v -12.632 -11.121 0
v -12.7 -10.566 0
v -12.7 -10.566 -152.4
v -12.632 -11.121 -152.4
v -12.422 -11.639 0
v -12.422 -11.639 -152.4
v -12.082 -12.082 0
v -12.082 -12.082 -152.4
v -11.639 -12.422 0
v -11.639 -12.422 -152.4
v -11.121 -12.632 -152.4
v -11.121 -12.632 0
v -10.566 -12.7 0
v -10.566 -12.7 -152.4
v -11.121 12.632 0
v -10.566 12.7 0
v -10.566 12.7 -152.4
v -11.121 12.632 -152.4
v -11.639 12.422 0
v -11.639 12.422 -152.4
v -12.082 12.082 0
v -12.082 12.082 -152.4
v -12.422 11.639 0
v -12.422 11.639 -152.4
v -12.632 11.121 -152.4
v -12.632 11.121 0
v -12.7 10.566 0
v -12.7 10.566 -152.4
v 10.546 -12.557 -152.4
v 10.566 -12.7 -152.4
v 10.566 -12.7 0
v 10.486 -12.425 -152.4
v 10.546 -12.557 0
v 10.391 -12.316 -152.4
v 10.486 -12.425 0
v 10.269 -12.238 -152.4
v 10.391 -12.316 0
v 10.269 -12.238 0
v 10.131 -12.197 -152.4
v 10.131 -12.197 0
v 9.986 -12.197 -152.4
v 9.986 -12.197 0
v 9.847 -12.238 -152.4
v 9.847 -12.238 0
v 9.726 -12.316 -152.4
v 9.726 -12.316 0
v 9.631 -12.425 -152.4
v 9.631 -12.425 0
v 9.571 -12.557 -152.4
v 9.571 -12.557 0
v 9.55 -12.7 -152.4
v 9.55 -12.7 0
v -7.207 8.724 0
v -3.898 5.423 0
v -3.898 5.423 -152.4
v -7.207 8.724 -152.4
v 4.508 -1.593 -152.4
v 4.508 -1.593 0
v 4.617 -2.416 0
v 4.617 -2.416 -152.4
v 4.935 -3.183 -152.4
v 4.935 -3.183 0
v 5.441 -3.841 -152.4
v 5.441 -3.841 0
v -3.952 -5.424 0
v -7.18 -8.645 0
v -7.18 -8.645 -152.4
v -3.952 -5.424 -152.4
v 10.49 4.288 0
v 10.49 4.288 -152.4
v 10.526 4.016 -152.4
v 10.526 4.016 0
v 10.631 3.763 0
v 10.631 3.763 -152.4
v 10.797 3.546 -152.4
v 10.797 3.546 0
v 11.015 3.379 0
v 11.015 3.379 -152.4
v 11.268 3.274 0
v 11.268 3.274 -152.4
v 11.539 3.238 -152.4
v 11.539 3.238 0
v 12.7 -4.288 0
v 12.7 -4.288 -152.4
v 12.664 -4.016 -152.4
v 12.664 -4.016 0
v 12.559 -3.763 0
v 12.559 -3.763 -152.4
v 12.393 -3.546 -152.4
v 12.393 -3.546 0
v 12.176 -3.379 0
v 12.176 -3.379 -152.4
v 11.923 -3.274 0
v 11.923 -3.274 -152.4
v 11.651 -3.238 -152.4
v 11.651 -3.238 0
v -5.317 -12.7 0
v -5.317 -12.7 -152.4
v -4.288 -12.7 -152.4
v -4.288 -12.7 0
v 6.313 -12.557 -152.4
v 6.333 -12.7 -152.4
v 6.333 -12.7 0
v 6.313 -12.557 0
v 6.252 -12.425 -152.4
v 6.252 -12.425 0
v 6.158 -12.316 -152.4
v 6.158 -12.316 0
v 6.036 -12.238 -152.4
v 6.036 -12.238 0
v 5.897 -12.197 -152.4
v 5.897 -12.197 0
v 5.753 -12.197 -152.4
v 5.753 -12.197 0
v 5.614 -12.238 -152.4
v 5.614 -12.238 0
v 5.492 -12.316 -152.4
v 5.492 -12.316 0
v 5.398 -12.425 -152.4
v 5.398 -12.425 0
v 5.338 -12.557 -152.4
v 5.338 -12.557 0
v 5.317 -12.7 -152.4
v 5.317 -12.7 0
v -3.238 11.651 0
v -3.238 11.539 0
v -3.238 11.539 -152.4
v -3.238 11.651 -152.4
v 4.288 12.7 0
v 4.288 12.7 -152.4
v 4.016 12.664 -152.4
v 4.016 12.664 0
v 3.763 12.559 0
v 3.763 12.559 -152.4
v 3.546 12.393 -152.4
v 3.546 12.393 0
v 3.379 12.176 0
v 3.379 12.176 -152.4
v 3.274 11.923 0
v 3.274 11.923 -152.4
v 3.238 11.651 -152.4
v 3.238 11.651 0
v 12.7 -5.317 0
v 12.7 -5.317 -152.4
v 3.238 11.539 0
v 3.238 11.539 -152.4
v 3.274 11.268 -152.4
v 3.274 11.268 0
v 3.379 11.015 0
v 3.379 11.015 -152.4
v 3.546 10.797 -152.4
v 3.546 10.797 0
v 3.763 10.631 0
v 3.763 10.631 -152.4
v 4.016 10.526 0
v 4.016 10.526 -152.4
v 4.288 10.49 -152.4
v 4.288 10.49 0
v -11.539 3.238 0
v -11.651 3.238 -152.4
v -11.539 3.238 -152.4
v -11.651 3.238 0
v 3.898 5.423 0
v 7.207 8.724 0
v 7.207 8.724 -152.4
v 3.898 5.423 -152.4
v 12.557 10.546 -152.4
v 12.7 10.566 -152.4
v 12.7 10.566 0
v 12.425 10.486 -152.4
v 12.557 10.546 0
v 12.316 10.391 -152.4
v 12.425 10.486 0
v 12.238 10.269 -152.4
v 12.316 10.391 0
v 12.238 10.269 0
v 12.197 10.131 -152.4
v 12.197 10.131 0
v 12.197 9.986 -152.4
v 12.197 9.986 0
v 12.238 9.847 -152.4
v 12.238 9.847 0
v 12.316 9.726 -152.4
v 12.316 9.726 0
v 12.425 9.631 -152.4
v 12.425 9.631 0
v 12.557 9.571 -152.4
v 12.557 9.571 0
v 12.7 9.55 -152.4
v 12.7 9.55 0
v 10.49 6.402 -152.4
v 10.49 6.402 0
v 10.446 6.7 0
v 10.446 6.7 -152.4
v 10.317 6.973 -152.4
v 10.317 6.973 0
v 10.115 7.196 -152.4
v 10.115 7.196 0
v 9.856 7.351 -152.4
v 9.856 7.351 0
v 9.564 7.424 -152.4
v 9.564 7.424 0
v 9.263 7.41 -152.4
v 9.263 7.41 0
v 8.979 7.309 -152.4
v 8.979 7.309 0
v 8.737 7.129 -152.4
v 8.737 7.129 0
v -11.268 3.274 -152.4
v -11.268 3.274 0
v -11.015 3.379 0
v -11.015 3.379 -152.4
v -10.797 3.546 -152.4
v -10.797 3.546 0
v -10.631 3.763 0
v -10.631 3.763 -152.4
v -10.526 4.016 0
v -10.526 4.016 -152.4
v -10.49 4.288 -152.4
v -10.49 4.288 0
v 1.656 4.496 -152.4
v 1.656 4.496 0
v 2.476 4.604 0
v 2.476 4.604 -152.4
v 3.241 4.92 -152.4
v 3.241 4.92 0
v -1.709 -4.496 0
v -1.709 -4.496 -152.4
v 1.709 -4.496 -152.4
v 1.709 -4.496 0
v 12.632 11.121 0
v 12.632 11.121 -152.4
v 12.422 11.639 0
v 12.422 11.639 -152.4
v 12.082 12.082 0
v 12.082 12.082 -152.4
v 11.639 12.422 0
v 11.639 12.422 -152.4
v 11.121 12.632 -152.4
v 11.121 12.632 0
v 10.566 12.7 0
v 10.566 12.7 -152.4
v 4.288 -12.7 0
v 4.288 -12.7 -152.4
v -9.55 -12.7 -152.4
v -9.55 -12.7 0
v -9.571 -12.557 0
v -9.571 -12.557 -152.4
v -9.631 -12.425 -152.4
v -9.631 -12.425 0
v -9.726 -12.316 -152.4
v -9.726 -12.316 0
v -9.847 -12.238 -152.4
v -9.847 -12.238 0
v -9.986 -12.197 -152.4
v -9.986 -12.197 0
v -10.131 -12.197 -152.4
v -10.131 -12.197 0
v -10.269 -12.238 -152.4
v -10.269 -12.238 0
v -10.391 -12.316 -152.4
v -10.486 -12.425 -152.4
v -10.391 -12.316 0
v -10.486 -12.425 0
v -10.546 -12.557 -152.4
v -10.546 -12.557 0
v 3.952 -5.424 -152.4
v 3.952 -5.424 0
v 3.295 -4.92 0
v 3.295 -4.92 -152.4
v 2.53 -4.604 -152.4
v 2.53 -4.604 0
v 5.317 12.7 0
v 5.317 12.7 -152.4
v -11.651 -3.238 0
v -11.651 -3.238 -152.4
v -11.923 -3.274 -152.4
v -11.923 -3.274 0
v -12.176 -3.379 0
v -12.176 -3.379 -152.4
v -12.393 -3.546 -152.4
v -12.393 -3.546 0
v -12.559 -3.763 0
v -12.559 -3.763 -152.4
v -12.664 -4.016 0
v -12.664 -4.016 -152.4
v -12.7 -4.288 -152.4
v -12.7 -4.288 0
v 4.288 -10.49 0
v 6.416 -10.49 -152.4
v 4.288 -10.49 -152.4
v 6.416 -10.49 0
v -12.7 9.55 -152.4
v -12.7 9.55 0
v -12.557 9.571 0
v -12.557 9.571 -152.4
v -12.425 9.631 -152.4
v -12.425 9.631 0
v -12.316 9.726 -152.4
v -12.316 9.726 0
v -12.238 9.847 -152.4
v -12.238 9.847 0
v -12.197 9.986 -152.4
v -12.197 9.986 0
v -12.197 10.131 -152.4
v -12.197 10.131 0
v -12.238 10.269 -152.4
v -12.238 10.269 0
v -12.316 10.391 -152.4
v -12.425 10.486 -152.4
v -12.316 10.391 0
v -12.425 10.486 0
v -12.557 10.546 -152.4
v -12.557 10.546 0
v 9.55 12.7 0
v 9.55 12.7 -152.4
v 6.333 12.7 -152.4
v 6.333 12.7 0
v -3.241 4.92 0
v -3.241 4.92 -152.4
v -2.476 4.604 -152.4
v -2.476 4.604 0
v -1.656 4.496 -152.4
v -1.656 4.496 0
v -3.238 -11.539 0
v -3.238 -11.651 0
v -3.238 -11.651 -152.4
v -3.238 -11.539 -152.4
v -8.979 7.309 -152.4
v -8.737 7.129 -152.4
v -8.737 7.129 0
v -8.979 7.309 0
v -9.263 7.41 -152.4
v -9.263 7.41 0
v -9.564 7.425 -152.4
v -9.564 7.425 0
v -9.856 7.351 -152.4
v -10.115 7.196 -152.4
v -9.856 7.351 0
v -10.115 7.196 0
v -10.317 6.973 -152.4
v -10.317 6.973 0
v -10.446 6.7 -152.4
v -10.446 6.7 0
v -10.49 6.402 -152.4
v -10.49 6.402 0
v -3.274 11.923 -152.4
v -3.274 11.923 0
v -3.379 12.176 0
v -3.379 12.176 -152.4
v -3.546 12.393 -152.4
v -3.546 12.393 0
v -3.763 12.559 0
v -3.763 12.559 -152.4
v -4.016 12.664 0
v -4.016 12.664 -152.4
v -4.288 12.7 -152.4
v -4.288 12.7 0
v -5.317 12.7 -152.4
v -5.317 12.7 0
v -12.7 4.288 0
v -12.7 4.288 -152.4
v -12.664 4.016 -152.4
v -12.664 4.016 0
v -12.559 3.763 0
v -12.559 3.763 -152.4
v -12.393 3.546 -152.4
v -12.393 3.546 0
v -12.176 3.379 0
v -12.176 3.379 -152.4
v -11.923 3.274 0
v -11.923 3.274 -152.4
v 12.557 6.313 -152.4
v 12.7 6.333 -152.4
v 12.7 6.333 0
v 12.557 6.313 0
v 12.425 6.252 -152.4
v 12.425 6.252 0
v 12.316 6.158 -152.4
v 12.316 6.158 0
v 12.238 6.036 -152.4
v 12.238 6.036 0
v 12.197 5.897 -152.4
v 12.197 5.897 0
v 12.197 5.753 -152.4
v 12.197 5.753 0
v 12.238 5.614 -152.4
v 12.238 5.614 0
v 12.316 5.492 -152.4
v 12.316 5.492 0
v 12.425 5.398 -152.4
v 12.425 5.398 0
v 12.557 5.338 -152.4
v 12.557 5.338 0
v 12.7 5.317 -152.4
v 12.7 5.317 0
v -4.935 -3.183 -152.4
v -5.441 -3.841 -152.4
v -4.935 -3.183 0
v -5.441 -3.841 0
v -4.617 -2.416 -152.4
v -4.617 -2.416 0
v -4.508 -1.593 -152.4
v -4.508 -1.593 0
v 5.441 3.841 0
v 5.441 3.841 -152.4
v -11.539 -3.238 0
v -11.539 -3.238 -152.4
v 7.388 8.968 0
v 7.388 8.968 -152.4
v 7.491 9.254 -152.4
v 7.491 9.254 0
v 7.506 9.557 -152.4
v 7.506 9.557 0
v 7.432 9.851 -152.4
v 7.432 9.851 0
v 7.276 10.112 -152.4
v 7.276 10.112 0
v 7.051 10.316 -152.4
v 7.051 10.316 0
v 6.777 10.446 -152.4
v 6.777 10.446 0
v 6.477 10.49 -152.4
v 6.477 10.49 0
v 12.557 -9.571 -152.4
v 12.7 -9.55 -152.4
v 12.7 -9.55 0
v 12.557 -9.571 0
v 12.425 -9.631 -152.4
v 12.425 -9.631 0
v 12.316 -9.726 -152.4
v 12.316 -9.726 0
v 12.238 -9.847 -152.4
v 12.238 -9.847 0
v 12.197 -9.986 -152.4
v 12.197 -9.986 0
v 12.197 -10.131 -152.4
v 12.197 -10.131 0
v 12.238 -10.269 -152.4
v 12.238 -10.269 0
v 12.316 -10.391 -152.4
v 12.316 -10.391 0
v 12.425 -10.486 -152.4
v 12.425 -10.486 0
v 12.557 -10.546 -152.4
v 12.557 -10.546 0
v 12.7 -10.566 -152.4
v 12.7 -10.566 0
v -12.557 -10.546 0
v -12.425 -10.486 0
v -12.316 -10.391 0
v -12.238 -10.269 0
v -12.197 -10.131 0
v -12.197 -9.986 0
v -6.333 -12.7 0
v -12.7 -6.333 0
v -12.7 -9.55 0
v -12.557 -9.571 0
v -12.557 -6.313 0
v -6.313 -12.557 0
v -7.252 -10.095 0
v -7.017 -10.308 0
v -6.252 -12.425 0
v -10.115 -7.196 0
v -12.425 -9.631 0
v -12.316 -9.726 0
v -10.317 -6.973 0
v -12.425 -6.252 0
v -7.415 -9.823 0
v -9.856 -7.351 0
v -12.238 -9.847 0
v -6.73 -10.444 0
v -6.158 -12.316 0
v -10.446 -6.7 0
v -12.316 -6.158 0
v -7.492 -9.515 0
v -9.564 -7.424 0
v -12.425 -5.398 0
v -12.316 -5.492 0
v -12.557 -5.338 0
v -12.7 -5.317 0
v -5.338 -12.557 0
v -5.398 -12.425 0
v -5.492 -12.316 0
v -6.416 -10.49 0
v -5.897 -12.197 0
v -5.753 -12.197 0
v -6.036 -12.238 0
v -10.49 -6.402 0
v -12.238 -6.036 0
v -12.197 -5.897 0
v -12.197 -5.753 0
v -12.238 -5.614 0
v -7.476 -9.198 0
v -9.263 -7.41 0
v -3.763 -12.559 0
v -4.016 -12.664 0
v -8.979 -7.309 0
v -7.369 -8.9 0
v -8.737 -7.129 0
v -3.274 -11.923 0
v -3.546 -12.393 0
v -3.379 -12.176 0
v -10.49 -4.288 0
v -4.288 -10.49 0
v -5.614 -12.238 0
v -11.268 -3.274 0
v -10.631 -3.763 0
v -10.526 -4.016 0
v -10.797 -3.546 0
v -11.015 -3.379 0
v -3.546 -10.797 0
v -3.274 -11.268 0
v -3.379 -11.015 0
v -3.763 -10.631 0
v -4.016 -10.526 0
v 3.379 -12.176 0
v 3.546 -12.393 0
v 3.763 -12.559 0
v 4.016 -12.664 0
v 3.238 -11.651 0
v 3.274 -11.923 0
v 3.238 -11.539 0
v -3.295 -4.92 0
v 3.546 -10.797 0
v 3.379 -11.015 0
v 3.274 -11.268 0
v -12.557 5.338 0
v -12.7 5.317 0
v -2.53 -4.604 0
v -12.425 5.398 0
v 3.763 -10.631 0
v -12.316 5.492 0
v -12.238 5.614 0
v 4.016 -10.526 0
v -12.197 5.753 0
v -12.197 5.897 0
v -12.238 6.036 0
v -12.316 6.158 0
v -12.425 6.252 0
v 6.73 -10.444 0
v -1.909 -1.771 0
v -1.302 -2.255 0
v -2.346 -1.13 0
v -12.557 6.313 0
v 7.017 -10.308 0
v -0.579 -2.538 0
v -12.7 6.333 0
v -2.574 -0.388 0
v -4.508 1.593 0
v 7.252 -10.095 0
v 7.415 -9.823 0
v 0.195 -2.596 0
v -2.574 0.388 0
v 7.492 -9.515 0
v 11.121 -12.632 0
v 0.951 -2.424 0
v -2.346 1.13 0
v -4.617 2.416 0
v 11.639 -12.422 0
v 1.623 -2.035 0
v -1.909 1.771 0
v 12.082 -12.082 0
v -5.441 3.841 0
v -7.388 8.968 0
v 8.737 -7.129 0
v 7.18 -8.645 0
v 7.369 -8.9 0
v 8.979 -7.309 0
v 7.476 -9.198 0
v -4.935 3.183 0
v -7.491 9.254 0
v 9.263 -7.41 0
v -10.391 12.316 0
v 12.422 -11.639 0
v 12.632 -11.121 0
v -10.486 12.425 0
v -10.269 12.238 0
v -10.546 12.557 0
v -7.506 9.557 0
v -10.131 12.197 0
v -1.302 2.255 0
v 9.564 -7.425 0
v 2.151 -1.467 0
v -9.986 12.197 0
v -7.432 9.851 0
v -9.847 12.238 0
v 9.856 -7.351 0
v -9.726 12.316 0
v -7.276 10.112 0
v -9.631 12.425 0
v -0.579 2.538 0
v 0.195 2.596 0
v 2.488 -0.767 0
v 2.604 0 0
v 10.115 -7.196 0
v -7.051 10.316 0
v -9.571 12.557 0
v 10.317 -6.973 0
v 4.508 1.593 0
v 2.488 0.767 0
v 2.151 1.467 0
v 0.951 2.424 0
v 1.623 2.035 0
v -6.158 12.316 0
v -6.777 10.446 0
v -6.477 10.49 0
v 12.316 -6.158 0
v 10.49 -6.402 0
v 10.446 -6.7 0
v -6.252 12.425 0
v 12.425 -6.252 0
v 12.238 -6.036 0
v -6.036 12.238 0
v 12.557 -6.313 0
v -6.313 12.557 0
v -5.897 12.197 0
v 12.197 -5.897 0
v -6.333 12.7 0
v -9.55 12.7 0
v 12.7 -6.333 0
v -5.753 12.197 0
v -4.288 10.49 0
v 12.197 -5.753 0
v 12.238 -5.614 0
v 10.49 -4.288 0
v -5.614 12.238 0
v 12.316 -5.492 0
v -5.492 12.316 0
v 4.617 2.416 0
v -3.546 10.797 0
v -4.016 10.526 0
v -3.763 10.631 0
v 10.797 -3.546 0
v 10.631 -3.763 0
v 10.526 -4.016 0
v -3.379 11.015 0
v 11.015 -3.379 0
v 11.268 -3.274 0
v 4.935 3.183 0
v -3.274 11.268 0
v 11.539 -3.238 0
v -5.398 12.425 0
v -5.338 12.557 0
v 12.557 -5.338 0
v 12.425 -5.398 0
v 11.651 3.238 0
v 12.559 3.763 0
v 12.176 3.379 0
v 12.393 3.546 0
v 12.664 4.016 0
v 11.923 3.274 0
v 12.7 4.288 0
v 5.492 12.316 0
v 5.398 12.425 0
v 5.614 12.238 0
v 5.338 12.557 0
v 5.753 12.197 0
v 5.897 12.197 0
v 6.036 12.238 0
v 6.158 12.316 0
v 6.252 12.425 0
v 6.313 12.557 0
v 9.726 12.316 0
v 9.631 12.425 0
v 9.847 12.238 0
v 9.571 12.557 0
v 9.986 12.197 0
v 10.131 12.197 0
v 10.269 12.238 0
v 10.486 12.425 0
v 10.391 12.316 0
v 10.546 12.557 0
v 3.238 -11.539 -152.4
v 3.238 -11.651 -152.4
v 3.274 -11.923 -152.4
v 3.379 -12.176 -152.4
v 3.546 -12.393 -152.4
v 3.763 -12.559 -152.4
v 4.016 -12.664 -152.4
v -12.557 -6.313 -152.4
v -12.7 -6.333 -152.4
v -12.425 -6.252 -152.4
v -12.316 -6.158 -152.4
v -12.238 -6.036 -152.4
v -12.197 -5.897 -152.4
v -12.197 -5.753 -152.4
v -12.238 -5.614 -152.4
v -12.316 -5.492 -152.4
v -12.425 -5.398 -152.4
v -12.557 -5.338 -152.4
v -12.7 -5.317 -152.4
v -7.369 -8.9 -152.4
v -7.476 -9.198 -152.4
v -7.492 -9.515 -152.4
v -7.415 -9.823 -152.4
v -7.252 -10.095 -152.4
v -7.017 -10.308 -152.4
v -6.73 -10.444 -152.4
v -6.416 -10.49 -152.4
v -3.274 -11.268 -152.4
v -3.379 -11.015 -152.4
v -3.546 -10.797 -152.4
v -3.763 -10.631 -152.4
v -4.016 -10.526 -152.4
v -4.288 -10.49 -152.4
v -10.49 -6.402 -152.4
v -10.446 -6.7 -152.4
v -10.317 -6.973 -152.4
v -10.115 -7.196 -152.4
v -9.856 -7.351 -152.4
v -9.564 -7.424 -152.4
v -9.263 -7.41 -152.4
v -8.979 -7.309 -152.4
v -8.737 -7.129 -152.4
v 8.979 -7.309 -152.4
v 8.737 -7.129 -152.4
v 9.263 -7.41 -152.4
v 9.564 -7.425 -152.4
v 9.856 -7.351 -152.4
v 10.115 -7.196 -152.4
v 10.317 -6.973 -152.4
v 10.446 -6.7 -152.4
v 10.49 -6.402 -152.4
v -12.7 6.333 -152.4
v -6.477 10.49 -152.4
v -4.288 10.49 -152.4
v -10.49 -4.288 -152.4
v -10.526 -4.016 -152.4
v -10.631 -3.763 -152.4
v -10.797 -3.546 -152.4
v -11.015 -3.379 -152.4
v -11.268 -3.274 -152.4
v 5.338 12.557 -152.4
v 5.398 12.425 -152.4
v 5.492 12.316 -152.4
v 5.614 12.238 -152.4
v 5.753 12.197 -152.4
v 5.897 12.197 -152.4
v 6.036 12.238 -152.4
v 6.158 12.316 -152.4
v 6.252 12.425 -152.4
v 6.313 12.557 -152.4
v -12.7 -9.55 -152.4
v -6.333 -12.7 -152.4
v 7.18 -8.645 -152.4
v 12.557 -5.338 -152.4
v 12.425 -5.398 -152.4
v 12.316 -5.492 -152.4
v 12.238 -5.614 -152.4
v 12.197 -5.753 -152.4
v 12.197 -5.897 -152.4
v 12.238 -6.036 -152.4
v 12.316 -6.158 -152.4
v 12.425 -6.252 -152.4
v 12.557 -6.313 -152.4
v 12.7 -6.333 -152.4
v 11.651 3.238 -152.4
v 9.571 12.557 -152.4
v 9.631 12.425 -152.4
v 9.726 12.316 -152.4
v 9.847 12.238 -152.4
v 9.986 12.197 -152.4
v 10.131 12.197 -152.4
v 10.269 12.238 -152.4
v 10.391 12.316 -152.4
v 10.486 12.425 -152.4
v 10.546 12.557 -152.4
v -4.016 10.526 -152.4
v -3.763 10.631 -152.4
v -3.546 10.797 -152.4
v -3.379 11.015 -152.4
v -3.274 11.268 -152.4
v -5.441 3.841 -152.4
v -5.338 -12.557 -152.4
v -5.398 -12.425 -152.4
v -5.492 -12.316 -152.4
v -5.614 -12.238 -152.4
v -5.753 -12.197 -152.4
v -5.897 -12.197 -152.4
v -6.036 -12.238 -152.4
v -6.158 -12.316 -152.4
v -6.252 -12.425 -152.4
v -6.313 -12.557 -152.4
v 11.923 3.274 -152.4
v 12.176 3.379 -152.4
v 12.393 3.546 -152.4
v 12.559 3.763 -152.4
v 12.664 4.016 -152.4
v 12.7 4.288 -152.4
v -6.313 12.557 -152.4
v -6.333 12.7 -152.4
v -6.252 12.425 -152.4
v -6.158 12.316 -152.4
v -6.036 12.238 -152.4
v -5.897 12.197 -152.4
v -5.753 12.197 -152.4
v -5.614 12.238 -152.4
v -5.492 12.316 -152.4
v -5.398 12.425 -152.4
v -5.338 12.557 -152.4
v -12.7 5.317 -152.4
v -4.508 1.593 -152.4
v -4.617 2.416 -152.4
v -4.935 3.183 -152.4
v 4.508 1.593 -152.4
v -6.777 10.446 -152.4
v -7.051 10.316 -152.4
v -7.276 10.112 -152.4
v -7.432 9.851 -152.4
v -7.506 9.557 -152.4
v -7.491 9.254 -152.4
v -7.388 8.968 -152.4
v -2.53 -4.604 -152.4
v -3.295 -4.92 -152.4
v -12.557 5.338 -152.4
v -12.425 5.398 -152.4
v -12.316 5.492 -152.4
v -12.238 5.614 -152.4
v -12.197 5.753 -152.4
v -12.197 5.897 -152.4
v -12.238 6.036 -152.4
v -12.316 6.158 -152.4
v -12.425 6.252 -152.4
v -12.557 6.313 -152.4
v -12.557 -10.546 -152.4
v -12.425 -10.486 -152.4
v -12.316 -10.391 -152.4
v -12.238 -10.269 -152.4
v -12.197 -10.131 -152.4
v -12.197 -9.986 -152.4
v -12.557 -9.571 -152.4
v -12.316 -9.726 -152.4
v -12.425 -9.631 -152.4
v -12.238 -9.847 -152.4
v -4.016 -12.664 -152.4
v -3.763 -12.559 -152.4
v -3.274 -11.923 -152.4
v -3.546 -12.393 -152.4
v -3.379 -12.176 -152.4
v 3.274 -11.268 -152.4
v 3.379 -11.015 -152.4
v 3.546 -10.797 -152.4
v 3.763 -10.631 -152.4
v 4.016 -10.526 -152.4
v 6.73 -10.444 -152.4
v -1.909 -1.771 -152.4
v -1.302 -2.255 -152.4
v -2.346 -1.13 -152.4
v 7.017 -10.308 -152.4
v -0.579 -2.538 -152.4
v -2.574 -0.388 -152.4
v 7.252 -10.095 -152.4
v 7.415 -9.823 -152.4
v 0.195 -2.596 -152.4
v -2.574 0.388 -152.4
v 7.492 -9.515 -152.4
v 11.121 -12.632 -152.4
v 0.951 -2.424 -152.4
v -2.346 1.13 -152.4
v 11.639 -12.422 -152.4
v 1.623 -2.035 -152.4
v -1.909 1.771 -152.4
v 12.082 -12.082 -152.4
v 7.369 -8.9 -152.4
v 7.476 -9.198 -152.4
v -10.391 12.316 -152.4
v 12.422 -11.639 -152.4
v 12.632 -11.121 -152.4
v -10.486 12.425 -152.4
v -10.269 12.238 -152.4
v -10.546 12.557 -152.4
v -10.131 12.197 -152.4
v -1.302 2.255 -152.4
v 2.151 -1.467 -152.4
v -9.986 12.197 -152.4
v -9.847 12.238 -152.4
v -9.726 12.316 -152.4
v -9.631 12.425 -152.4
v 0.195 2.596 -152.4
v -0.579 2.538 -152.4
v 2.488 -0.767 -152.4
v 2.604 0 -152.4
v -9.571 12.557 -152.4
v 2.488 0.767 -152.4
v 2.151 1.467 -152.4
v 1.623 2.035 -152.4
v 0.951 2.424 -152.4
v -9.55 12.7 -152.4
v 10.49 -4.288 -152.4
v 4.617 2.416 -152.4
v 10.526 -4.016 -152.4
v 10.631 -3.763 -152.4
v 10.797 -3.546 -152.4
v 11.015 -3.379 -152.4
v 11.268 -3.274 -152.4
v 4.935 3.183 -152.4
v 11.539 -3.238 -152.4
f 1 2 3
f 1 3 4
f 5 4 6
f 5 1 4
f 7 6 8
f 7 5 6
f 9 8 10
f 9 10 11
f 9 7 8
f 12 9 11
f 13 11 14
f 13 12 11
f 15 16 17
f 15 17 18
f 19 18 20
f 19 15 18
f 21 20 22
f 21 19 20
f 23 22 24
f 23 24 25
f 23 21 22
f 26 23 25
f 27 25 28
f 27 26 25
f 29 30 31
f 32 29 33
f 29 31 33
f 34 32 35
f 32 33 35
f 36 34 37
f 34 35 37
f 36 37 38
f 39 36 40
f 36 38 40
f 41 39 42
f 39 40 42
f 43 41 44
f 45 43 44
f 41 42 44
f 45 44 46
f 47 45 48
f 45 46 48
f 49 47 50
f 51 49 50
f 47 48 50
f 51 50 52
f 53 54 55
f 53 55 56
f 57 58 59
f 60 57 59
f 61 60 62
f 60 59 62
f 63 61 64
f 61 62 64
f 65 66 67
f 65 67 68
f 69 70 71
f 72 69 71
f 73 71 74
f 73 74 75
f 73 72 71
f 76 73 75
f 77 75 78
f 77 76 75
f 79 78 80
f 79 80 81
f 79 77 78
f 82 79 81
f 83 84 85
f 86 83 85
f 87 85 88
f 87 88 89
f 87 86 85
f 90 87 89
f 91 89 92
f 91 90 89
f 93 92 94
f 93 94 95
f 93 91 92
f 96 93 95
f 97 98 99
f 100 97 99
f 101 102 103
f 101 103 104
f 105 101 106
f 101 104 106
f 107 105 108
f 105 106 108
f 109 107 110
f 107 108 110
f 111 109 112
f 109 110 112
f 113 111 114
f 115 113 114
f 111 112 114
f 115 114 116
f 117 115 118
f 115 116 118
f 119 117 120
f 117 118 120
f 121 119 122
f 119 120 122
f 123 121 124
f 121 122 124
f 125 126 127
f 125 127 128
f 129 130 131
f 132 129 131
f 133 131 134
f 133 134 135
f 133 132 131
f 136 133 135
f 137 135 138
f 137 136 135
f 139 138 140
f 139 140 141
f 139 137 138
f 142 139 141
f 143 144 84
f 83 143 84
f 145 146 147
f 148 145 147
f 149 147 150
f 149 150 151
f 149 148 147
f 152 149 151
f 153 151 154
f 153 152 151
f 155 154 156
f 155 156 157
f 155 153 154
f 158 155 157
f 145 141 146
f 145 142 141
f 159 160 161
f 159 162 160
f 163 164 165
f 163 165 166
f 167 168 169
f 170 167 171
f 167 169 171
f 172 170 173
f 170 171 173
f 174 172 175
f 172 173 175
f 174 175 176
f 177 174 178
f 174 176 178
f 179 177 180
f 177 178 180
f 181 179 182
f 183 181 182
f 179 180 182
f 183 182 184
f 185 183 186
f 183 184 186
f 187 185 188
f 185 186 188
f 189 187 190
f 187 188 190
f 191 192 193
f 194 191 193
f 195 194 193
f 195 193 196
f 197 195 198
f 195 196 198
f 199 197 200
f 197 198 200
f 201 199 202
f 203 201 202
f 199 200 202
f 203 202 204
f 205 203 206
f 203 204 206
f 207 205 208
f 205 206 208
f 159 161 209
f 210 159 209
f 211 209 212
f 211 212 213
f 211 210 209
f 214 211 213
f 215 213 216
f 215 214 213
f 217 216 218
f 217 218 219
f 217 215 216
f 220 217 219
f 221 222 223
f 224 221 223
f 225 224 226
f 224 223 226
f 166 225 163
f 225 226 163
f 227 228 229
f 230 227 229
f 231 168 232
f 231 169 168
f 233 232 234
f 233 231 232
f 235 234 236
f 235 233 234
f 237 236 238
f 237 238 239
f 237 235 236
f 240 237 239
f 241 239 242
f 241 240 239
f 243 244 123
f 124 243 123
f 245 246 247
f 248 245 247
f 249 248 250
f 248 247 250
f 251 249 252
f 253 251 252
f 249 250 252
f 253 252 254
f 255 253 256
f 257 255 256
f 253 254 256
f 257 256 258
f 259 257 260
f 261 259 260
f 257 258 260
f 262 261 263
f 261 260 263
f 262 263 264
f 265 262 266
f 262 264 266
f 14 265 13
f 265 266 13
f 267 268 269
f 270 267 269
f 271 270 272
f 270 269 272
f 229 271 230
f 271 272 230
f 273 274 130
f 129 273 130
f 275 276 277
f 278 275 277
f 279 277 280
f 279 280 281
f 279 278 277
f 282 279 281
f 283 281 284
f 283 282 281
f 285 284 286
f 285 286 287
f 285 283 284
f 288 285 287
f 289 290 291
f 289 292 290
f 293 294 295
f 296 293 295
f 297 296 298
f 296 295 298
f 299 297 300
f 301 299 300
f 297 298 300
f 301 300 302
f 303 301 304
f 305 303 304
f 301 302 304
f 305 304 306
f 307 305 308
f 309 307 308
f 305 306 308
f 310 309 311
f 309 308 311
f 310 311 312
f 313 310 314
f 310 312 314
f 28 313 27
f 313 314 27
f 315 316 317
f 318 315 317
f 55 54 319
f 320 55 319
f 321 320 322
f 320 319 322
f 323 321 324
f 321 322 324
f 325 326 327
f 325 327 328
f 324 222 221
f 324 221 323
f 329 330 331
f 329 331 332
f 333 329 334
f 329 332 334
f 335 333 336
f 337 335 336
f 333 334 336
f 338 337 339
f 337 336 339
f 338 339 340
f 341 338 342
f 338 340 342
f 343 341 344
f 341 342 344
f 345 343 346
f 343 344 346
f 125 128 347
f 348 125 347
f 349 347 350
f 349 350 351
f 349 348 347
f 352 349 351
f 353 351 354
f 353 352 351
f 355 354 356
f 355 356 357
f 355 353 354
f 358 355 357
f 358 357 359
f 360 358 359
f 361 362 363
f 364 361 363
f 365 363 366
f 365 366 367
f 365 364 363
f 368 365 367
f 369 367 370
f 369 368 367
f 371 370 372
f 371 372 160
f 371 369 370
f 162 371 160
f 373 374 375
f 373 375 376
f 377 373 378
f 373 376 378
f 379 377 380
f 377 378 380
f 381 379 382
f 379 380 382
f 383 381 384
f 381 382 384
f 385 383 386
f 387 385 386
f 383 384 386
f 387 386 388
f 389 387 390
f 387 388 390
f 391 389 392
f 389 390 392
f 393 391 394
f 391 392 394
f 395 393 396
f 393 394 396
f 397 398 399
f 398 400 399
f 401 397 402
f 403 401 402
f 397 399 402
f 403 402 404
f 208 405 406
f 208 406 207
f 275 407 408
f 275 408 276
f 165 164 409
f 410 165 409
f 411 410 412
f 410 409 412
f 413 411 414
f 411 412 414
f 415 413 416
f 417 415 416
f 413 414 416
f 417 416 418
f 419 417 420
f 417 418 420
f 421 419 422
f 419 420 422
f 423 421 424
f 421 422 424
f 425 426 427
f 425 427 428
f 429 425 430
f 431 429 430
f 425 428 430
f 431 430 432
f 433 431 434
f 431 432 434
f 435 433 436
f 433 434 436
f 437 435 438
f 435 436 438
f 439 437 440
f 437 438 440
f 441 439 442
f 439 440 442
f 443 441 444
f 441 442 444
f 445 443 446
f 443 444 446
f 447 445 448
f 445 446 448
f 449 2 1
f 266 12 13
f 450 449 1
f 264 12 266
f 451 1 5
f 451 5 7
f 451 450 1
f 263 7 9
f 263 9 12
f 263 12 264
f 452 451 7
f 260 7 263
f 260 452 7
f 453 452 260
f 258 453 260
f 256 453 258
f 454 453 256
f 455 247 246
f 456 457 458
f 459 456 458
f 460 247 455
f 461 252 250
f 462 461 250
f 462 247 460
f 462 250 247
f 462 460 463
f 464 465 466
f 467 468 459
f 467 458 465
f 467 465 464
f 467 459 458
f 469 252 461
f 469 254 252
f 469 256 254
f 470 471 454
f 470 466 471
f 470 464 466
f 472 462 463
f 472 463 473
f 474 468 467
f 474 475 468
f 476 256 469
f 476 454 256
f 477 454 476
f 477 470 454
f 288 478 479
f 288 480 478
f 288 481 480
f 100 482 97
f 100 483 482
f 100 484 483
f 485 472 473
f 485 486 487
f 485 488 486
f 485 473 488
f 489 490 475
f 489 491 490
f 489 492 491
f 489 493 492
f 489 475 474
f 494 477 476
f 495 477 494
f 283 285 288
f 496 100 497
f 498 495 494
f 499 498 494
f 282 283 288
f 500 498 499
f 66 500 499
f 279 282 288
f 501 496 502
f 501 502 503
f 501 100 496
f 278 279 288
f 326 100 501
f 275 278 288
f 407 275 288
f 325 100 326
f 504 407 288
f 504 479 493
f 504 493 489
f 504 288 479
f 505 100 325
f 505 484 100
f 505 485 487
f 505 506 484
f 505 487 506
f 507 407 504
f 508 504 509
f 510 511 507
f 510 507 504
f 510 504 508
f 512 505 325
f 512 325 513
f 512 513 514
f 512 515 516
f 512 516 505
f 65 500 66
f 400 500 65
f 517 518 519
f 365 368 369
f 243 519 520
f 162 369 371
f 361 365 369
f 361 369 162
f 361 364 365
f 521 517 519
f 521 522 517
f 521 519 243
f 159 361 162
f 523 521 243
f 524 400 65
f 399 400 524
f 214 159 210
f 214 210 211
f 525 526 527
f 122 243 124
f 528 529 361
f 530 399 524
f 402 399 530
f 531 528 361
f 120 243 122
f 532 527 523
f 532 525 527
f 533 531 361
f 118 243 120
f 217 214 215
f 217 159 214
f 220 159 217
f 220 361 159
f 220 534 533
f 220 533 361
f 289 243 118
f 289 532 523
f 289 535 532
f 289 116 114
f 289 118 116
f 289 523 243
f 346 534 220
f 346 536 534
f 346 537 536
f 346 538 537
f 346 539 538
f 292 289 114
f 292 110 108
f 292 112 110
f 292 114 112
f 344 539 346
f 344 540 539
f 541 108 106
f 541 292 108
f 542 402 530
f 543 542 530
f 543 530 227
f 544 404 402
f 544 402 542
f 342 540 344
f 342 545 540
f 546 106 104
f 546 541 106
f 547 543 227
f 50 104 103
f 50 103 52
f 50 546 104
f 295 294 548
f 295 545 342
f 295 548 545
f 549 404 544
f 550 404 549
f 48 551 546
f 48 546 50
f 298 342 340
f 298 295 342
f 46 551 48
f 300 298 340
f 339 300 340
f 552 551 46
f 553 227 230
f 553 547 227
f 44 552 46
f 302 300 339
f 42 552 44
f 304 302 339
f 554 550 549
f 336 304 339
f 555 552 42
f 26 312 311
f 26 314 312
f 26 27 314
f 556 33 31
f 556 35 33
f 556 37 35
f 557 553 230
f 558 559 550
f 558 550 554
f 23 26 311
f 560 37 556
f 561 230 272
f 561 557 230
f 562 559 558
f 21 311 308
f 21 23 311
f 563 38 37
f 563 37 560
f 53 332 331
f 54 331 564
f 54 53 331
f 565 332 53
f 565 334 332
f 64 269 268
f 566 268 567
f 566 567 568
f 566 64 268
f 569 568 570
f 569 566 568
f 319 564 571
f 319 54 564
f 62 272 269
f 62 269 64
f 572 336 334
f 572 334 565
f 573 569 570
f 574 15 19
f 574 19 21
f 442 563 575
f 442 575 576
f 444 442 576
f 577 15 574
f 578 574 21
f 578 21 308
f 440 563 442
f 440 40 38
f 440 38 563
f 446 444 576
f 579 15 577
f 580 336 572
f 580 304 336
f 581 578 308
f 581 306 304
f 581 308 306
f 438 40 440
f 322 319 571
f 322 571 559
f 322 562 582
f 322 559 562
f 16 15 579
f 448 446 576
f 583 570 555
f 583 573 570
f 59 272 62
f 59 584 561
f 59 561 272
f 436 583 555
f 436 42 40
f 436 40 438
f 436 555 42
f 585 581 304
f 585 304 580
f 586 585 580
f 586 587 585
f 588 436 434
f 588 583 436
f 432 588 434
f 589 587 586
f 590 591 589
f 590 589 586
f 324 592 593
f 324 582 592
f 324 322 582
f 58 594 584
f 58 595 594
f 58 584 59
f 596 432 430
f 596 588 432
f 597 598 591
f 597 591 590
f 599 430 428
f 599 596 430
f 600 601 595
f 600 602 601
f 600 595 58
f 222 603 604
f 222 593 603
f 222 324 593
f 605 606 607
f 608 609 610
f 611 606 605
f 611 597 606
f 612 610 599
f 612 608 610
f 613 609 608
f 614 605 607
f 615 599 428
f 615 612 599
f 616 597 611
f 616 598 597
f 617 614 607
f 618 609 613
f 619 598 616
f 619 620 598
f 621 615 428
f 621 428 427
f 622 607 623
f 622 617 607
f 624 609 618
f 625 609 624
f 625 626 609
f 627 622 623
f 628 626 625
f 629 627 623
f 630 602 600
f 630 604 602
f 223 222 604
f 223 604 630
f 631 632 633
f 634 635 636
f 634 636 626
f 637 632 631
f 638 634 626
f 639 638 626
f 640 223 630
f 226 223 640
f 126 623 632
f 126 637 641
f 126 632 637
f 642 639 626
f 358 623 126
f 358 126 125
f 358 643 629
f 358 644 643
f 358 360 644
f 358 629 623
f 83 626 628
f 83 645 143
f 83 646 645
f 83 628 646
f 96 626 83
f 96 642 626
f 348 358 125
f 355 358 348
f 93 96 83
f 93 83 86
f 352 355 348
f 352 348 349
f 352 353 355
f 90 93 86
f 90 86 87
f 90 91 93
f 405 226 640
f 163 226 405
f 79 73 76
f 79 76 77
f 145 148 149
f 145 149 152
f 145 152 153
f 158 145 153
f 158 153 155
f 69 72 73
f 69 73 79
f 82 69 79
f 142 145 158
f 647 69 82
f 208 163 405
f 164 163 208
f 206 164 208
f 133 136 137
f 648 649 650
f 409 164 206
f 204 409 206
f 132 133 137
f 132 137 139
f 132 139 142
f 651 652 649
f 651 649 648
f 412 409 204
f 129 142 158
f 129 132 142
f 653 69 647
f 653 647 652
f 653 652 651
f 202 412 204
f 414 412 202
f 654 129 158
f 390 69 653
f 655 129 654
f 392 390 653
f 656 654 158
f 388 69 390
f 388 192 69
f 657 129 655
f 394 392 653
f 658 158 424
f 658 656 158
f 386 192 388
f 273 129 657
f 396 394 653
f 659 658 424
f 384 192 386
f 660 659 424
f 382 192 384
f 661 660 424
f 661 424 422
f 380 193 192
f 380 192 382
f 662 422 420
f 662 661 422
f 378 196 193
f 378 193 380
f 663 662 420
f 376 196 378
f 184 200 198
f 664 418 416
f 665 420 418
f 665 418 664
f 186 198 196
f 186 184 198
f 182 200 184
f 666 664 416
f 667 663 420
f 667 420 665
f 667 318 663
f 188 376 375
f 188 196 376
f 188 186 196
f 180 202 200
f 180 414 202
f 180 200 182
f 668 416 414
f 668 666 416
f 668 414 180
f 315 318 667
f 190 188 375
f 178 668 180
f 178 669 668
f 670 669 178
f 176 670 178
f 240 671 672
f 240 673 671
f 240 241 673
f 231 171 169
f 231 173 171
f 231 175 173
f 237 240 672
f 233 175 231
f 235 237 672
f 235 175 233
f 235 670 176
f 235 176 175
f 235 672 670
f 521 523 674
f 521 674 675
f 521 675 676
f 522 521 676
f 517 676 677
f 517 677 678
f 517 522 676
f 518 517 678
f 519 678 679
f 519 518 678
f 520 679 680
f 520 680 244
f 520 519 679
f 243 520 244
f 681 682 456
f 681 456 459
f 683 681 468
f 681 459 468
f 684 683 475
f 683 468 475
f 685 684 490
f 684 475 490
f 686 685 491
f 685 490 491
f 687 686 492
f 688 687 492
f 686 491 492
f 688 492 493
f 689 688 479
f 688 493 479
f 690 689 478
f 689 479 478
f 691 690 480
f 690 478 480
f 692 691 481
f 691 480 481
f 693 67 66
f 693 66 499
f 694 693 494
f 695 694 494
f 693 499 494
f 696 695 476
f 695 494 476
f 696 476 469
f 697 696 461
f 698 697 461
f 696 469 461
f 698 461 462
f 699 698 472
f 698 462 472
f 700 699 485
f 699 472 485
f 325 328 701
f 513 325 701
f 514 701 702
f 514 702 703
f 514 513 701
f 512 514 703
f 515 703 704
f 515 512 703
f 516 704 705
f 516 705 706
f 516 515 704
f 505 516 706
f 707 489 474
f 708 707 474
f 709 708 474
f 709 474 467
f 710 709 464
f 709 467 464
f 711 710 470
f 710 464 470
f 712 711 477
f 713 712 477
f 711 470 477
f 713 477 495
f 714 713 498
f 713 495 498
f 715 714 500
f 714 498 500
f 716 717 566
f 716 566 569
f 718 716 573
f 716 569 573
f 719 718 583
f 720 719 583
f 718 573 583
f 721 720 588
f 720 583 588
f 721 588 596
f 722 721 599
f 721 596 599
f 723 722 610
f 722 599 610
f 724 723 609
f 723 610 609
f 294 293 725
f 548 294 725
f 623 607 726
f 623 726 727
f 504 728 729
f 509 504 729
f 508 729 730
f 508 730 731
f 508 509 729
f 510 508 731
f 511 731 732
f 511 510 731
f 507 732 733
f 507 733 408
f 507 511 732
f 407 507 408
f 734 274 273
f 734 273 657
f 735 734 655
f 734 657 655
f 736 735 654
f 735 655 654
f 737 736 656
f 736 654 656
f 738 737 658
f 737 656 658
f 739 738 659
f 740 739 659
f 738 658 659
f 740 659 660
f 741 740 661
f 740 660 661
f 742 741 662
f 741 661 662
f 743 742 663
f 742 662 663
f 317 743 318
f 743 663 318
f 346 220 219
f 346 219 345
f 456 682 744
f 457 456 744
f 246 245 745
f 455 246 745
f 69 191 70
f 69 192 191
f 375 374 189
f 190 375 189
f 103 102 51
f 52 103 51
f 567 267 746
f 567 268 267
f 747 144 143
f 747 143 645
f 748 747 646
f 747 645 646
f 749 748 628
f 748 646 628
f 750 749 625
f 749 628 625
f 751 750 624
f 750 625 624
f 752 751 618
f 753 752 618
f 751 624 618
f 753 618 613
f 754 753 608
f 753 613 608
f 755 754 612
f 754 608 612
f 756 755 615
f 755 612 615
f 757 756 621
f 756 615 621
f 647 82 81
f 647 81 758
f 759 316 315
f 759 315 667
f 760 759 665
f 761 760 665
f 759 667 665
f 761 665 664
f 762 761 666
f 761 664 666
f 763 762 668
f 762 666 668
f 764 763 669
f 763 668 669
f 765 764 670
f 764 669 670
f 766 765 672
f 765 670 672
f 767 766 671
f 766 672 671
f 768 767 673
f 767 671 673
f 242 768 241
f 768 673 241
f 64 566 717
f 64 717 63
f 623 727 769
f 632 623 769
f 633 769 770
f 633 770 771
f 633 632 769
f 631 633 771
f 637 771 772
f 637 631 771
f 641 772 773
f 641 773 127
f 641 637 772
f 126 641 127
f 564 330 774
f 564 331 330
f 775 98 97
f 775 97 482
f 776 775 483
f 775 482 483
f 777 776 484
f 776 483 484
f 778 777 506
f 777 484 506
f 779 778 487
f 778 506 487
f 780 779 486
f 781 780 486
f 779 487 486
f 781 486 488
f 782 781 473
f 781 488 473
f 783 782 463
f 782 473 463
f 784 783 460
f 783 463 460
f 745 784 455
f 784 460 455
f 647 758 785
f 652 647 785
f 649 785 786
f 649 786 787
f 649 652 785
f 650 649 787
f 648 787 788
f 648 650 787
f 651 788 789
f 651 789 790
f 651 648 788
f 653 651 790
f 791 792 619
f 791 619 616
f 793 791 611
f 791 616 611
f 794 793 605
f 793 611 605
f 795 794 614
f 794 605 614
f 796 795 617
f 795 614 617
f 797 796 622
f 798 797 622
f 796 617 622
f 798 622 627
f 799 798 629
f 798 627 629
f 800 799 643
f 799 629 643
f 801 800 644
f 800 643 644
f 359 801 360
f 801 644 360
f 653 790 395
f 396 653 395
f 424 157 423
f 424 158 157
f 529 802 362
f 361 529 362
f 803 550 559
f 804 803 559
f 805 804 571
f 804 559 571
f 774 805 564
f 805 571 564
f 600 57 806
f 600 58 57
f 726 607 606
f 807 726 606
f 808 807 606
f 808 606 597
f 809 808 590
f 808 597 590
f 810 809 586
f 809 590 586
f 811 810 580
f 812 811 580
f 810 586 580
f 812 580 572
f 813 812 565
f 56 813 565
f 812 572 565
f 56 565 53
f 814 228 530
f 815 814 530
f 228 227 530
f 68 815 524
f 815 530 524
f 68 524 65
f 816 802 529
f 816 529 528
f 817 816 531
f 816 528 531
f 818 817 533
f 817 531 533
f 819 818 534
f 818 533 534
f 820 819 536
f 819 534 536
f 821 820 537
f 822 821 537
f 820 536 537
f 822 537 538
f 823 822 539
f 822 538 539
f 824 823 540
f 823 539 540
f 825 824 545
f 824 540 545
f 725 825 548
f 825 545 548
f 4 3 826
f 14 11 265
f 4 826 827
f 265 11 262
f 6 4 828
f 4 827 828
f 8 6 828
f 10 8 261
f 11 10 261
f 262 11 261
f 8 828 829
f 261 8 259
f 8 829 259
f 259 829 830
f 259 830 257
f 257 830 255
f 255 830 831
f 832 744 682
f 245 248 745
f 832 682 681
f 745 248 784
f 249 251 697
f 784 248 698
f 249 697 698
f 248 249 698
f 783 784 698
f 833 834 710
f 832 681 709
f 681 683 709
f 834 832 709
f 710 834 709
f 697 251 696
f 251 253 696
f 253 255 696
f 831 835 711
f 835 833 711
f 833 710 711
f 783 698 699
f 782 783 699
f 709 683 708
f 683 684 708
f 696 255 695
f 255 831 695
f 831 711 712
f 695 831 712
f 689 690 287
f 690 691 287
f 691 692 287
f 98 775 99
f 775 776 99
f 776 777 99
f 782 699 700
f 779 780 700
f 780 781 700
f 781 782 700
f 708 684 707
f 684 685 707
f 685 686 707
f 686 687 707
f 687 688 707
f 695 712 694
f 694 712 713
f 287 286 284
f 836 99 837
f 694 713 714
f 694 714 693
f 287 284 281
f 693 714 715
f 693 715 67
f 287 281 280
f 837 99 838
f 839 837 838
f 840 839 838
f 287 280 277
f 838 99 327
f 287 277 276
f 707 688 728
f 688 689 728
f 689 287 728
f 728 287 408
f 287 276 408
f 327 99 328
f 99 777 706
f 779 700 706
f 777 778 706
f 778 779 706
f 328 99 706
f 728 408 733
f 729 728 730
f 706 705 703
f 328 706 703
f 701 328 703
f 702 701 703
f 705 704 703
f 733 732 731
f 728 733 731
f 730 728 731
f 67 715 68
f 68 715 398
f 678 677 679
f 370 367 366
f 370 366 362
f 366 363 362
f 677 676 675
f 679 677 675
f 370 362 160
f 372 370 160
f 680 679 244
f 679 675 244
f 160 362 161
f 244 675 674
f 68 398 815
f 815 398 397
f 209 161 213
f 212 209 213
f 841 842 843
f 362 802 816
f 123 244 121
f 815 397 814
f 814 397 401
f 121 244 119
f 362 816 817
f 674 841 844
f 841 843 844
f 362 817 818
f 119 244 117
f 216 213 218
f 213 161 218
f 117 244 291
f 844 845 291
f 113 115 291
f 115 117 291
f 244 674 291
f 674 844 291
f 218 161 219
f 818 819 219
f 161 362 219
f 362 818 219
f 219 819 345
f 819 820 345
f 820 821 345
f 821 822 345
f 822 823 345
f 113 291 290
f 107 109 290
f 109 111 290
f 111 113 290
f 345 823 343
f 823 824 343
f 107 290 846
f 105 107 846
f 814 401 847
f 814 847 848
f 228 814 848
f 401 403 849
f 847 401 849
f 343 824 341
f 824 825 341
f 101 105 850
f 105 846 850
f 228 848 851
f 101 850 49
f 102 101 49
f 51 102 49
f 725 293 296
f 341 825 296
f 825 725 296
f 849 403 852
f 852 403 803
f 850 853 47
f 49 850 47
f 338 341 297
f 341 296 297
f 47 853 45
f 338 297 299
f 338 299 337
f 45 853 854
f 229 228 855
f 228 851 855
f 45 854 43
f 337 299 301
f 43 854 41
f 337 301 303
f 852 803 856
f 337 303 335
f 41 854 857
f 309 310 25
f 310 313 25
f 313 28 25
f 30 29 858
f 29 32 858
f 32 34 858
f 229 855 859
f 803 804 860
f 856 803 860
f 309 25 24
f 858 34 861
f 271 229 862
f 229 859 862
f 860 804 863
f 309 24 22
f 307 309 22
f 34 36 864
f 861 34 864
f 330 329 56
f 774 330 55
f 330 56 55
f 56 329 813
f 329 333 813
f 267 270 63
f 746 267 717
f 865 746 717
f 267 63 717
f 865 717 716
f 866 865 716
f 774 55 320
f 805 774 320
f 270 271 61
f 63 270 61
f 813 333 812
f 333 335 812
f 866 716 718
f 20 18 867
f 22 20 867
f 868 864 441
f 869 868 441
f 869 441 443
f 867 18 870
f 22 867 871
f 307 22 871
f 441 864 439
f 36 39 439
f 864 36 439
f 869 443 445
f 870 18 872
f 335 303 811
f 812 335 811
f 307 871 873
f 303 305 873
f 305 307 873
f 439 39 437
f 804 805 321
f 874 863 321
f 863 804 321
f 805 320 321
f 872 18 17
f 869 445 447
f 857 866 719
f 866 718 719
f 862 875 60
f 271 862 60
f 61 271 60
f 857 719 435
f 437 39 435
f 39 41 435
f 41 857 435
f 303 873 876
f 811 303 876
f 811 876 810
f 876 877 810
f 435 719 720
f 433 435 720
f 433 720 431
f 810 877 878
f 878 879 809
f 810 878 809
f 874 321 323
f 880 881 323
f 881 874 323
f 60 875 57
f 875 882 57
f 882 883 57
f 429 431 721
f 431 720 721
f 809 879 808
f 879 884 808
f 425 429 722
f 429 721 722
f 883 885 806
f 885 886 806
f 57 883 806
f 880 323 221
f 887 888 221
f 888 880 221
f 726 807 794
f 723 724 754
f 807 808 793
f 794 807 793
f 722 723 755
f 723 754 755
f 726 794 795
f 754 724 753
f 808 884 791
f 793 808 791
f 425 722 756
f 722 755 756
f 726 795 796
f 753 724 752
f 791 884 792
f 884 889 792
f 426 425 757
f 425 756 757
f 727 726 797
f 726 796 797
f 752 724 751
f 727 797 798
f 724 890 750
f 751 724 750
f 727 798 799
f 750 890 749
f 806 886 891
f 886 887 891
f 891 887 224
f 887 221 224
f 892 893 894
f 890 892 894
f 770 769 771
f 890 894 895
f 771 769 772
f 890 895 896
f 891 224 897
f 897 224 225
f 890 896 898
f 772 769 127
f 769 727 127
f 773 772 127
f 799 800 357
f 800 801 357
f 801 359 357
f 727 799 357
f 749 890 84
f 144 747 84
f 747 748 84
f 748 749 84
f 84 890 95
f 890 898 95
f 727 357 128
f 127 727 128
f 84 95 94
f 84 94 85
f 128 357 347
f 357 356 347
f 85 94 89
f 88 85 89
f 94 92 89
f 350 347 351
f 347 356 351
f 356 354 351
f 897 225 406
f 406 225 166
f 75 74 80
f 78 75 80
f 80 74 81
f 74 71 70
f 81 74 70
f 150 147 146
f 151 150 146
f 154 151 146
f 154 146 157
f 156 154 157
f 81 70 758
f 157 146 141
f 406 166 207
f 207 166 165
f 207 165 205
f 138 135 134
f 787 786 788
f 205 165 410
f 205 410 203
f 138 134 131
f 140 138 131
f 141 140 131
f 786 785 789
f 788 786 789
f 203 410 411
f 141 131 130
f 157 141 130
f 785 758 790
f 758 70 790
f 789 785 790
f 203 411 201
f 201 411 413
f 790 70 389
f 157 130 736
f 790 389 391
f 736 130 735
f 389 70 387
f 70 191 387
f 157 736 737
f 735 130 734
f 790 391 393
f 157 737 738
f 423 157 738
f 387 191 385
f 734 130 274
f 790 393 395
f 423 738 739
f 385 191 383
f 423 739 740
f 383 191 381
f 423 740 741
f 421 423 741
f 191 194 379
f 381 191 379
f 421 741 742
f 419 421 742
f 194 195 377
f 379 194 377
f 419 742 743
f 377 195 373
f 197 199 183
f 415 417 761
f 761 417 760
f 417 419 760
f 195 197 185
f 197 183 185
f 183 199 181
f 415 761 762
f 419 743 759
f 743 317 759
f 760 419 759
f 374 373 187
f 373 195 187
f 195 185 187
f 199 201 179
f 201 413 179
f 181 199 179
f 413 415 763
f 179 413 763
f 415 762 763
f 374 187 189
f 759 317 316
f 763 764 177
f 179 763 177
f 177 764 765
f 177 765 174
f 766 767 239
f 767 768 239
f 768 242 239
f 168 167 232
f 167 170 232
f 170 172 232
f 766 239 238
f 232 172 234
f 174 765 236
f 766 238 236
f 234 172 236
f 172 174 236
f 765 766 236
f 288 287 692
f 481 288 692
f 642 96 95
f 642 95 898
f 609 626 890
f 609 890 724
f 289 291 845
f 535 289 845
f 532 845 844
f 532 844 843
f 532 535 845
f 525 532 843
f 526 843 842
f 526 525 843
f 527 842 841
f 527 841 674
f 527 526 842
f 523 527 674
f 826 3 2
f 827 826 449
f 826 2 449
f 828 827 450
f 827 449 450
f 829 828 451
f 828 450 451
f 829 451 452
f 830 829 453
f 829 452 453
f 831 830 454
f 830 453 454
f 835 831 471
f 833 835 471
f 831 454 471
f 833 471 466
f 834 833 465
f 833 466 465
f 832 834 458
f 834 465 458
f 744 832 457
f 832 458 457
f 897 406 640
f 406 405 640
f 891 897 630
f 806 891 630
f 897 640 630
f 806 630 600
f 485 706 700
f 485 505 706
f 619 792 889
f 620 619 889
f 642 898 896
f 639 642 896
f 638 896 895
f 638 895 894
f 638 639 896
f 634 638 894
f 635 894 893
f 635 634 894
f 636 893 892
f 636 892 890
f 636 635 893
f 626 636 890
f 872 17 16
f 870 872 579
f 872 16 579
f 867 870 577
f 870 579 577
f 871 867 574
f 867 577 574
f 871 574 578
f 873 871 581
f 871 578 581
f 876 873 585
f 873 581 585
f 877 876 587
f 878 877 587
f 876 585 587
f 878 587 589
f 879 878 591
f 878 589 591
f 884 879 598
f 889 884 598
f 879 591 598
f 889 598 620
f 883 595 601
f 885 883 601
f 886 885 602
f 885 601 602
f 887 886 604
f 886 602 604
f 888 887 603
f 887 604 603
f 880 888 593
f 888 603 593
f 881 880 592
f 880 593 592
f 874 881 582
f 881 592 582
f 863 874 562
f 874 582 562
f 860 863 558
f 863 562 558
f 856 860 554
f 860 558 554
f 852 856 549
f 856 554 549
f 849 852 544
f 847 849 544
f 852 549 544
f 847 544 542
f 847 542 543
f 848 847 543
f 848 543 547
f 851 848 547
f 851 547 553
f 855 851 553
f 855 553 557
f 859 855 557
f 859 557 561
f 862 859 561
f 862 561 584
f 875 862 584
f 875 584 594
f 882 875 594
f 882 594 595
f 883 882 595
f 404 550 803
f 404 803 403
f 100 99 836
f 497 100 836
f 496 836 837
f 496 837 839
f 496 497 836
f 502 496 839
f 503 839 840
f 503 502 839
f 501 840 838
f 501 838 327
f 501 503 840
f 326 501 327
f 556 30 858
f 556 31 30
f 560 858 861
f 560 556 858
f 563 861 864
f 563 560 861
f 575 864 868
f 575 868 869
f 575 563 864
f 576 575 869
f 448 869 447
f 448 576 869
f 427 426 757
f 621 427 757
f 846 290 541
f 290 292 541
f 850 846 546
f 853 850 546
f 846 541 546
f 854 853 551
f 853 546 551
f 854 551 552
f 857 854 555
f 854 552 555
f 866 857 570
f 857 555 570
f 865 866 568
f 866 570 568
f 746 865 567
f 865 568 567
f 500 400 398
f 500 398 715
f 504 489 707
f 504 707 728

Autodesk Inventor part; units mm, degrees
ref_plane "YZ Plane" through (0, 0, 0) normal (1, 0, 0) x (0, 1, 0)
ref_plane "XZ Plane" through (0, 0, 0) normal (0, 1, 0) x (-1, 0, 0)
ref_plane "XY Plane" through (0, 0, 0) normal (0, 0, 1) x (1, 0, 0)
sketch "Sketch1" plane through (0, 0, 0) normal (0, 0, 1) x (1, 0, 0)
  circle A0 centre (0, 0) radius 2.6035
  arc A1 (-1.7093, -4.4958) -> (-3.9523, -5.4237) centre (-1.7093, -7.6708) ccw
  line L0 (-1.7093, -4.4958) -> (1.7093, -4.4958)
  arc A2 (3.9523, -5.4237) -> (1.7093, -4.4958) centre (1.7093, -7.6708) ccw
  line L1 (3.9523, -5.4237) -> (7.1797, -8.6452)
  arc A3 (6.4164, -10.4902) -> (7.1797, -8.6452) centre (6.4164, -9.4098) ccw
  line L2 (6.4164, -10.4902) -> (4.2875, -10.4902)
  arc A4 (4.2875, -10.4902) -> (3.2385, -11.5392) centre (4.2875, -11.5392) ccw
  line L3 (3.2385, -11.5392) -> (3.2385, -11.651)
  arc A5 (3.2385, -11.651) -> (4.2875, -12.7) centre (4.2875, -11.651) ccw
  line L4 (4.2875, -12.7) -> (5.3171, -12.7)
  arc A6 (6.3331, -12.7) -> (5.3171, -12.7) centre (5.8251, -12.7) ccw
  line L5 (6.3331, -12.7) -> (9.5504, -12.7)
  arc A7 (10.5664, -12.6998) -> (9.5504, -12.7) centre (10.0584, -12.7) ccw
  arc A8 (10.5664, -12.6998) -> (12.6998, -10.5664) centre (10.5918, -10.5918) ccw
  arc A9 (12.7, -9.5504) -> (12.6998, -10.5664) centre (12.7, -10.0584) ccw
  line L6 (12.7, -9.5504) -> (12.7, -6.3331)
  arc A10 (12.7, -5.3171) -> (12.7, -6.3331) centre (12.7, -5.8251) ccw
  line L7 (12.7, -5.3171) -> (12.7, -4.2875)
  arc A11 (12.7, -4.2875) -> (11.651, -3.2385) centre (11.651, -4.2875) ccw
  line L8 (11.651, -3.2385) -> (11.5392, -3.2385)
  arc A12 (11.5392, -3.2385) -> (10.4902, -4.2875) centre (11.5392, -4.2875) ccw
  line L9 (10.4902, -4.2875) -> (10.4902, -6.4021)
  arc A13 (8.7371, -7.1294) -> (10.4902, -6.4021) centre (9.4628, -6.4021) ccw
  line L10 (8.7371, -7.1294) -> (5.441, -3.8408)
  arc A14 (4.5085, -1.5932) -> (5.441, -3.8408) centre (7.6835, -1.5932) ccw
  line L11 (4.5085, -1.5932) -> (4.5085, 1.5932)
  arc A15 (5.441, 3.8408) -> (4.5085, 1.5932) centre (7.6835, 1.5932) ccw
  line L12 (5.441, 3.8408) -> (8.7371, 7.1294)
  arc A16 (10.4902, 6.4021) -> (8.7371, 7.1294) centre (9.4628, 6.4021) ccw
  line L13 (10.4902, 6.4021) -> (10.4902, 4.2875)
  arc A17 (10.4902, 4.2875) -> (11.5392, 3.2385) centre (11.5392, 4.2875) ccw
  line L14 (11.5392, 3.2385) -> (11.651, 3.2385)
  arc A18 (11.651, 3.2385) -> (12.7, 4.2875) centre (11.651, 4.2875) ccw
  line L15 (12.7, 4.2875) -> (12.7, 5.3171)
  arc A19 (12.7, 6.3331) -> (12.7, 5.3171) centre (12.7, 5.8251) ccw
  line L16 (12.7, 6.3331) -> (12.7, 9.5504)
  arc A20 (12.6998, 10.5664) -> (12.7, 9.5504) centre (12.7, 10.0584) ccw
  arc A21 (12.6998, 10.5664) -> (10.5664, 12.6998) centre (10.5918, 10.5918) ccw
  arc A22 (9.5504, 12.7) -> (10.5664, 12.6998) centre (10.0584, 12.7) ccw
  line L17 (9.5504, 12.7) -> (6.3331, 12.7)
  arc A23 (5.3171, 12.7) -> (6.3331, 12.7) centre (5.8251, 12.7) ccw
  line L18 (5.3171, 12.7) -> (4.2875, 12.7)
  arc A24 (4.2875, 12.7) -> (3.2385, 11.651) centre (4.2875, 11.651) ccw
  line L19 (3.2385, 11.651) -> (3.2385, 11.5392)
  arc A25 (3.2385, 11.5392) -> (4.2875, 10.4902) centre (4.2875, 11.5392) ccw
  line L20 (4.2875, 10.4902) -> (6.4768, 10.4902)
  arc A26 (7.207, 8.7244) -> (6.4768, 10.4902) centre (6.4768, 9.4563) ccw
  line L21 (7.207, 8.7244) -> (3.8983, 5.4232)
  arc A27 (1.6558, 4.4958) -> (3.8983, 5.4232) centre (1.6558, 7.6708) ccw
  line L22 (1.6558, 4.4958) -> (-1.6558, 4.4958)
  arc A28 (-3.8983, 5.4232) -> (-1.6558, 4.4958) centre (-1.6558, 7.6708) ccw
  line L23 (-3.8983, 5.4232) -> (-7.207, 8.7244)
  arc A29 (-6.4768, 10.4902) -> (-7.207, 8.7244) centre (-6.4768, 9.4563) ccw
  line L24 (-6.4768, 10.4902) -> (-4.2875, 10.4902)
  arc A30 (-4.2875, 10.4902) -> (-3.2385, 11.5392) centre (-4.2875, 11.5392) ccw
  line L25 (-3.2385, 11.5392) -> (-3.2385, 11.651)
  arc A31 (-3.2385, 11.651) -> (-4.2875, 12.7) centre (-4.2875, 11.651) ccw
  line L26 (-4.2875, 12.7) -> (-5.3171, 12.7)
  arc A32 (-6.3331, 12.7) -> (-5.3171, 12.7) centre (-5.8251, 12.7) ccw
  line L27 (-6.3331, 12.7) -> (-9.5504, 12.7)
  arc A33 (-10.5664, 12.6998) -> (-9.5504, 12.7) centre (-10.0584, 12.7) ccw
  arc A34 (-10.5664, 12.6998) -> (-12.6998, 10.5664) centre (-10.5918, 10.5918) ccw
  arc A35 (-12.7, 9.5504) -> (-12.6998, 10.5664) centre (-12.7, 10.0584) ccw
  line L28 (-12.7, 9.5504) -> (-12.7, 6.3331)
  arc A36 (-12.7, 5.3171) -> (-12.7, 6.3331) centre (-12.7, 5.8251) ccw
  line L29 (-12.7, 5.3171) -> (-12.7, 4.2875)
  arc A37 (-12.7, 4.2875) -> (-11.651, 3.2385) centre (-11.651, 4.2875) ccw
  line L30 (-11.651, 3.2385) -> (-11.5392, 3.2385)
  arc A38 (-11.5392, 3.2385) -> (-10.4902, 4.2875) centre (-11.5392, 4.2875) ccw
  line L31 (-10.4902, 4.2875) -> (-10.4902, 6.4021)
  arc A39 (-8.7371, 7.1294) -> (-10.4902, 6.4021) centre (-9.4628, 6.4021) ccw
  line L32 (-8.7371, 7.1294) -> (-5.441, 3.8408)
  arc A40 (-4.5085, 1.5932) -> (-5.441, 3.8408) centre (-7.6835, 1.5932) ccw
  line L33 (-4.5085, 1.5932) -> (-4.5085, -1.5932)
  arc A41 (-5.441, -3.8408) -> (-4.5085, -1.5932) centre (-7.6835, -1.5932) ccw
  line L34 (-5.441, -3.8408) -> (-8.7371, -7.1294)
  arc A42 (-10.4902, -6.4021) -> (-8.7371, -7.1294) centre (-9.4628, -6.4021) ccw
  line L35 (-10.4902, -6.4021) -> (-10.4902, -4.2875)
  arc A43 (-10.4902, -4.2875) -> (-11.5392, -3.2385) centre (-11.5392, -4.2875) ccw
  line L36 (-11.5392, -3.2385) -> (-11.651, -3.2385)
  arc A44 (-11.651, -3.2385) -> (-12.7, -4.2875) centre (-11.651, -4.2875) ccw
  line L37 (-12.7, -4.2875) -> (-12.7, -5.3171)
  arc A45 (-12.7, -6.3331) -> (-12.7, -5.3171) centre (-12.7, -5.8251) ccw
  line L38 (-12.7, -6.3331) -> (-12.7, -9.5504)
  arc A46 (-12.6998, -10.5664) -> (-12.7, -9.5504) centre (-12.7, -10.0584) ccw
  arc A47 (-12.6998, -10.5664) -> (-10.5664, -12.6998) centre (-10.5918, -10.5918) ccw
  arc A48 (-9.5504, -12.7) -> (-10.5664, -12.6998) centre (-10.0584, -12.7) ccw
  line L39 (-9.5504, -12.7) -> (-6.3331, -12.7)
  arc A49 (-5.3171, -12.7) -> (-6.3331, -12.7) centre (-5.8251, -12.7) ccw
  line L40 (-5.3171, -12.7) -> (-4.2875, -12.7)
  arc A50 (-4.2875, -12.7) -> (-3.2385, -11.651) centre (-4.2875, -11.651) ccw
  line L41 (-3.2385, -11.651) -> (-3.2385, -11.5392)
  arc A51 (-3.2385, -11.5392) -> (-4.2875, -10.4902) centre (-4.2875, -11.5392) ccw
  line L42 (-4.2875, -10.4902) -> (-6.4164, -10.4902)
  arc A52 (-7.1797, -8.6452) -> (-6.4164, -10.4902) centre (-6.4164, -9.4098) ccw
  line L43 (-7.1797, -8.6452) -> (-3.9523, -5.4237)
extrude "Extrusion1" add sketch "Sketch1" against normal blind 152.4
sketch "Sketch2" plane through (0, 0, 0) normal (1, 0, 0) x (0, 1, 0)
  point P0 (0, 0)
properties part number "1010"
